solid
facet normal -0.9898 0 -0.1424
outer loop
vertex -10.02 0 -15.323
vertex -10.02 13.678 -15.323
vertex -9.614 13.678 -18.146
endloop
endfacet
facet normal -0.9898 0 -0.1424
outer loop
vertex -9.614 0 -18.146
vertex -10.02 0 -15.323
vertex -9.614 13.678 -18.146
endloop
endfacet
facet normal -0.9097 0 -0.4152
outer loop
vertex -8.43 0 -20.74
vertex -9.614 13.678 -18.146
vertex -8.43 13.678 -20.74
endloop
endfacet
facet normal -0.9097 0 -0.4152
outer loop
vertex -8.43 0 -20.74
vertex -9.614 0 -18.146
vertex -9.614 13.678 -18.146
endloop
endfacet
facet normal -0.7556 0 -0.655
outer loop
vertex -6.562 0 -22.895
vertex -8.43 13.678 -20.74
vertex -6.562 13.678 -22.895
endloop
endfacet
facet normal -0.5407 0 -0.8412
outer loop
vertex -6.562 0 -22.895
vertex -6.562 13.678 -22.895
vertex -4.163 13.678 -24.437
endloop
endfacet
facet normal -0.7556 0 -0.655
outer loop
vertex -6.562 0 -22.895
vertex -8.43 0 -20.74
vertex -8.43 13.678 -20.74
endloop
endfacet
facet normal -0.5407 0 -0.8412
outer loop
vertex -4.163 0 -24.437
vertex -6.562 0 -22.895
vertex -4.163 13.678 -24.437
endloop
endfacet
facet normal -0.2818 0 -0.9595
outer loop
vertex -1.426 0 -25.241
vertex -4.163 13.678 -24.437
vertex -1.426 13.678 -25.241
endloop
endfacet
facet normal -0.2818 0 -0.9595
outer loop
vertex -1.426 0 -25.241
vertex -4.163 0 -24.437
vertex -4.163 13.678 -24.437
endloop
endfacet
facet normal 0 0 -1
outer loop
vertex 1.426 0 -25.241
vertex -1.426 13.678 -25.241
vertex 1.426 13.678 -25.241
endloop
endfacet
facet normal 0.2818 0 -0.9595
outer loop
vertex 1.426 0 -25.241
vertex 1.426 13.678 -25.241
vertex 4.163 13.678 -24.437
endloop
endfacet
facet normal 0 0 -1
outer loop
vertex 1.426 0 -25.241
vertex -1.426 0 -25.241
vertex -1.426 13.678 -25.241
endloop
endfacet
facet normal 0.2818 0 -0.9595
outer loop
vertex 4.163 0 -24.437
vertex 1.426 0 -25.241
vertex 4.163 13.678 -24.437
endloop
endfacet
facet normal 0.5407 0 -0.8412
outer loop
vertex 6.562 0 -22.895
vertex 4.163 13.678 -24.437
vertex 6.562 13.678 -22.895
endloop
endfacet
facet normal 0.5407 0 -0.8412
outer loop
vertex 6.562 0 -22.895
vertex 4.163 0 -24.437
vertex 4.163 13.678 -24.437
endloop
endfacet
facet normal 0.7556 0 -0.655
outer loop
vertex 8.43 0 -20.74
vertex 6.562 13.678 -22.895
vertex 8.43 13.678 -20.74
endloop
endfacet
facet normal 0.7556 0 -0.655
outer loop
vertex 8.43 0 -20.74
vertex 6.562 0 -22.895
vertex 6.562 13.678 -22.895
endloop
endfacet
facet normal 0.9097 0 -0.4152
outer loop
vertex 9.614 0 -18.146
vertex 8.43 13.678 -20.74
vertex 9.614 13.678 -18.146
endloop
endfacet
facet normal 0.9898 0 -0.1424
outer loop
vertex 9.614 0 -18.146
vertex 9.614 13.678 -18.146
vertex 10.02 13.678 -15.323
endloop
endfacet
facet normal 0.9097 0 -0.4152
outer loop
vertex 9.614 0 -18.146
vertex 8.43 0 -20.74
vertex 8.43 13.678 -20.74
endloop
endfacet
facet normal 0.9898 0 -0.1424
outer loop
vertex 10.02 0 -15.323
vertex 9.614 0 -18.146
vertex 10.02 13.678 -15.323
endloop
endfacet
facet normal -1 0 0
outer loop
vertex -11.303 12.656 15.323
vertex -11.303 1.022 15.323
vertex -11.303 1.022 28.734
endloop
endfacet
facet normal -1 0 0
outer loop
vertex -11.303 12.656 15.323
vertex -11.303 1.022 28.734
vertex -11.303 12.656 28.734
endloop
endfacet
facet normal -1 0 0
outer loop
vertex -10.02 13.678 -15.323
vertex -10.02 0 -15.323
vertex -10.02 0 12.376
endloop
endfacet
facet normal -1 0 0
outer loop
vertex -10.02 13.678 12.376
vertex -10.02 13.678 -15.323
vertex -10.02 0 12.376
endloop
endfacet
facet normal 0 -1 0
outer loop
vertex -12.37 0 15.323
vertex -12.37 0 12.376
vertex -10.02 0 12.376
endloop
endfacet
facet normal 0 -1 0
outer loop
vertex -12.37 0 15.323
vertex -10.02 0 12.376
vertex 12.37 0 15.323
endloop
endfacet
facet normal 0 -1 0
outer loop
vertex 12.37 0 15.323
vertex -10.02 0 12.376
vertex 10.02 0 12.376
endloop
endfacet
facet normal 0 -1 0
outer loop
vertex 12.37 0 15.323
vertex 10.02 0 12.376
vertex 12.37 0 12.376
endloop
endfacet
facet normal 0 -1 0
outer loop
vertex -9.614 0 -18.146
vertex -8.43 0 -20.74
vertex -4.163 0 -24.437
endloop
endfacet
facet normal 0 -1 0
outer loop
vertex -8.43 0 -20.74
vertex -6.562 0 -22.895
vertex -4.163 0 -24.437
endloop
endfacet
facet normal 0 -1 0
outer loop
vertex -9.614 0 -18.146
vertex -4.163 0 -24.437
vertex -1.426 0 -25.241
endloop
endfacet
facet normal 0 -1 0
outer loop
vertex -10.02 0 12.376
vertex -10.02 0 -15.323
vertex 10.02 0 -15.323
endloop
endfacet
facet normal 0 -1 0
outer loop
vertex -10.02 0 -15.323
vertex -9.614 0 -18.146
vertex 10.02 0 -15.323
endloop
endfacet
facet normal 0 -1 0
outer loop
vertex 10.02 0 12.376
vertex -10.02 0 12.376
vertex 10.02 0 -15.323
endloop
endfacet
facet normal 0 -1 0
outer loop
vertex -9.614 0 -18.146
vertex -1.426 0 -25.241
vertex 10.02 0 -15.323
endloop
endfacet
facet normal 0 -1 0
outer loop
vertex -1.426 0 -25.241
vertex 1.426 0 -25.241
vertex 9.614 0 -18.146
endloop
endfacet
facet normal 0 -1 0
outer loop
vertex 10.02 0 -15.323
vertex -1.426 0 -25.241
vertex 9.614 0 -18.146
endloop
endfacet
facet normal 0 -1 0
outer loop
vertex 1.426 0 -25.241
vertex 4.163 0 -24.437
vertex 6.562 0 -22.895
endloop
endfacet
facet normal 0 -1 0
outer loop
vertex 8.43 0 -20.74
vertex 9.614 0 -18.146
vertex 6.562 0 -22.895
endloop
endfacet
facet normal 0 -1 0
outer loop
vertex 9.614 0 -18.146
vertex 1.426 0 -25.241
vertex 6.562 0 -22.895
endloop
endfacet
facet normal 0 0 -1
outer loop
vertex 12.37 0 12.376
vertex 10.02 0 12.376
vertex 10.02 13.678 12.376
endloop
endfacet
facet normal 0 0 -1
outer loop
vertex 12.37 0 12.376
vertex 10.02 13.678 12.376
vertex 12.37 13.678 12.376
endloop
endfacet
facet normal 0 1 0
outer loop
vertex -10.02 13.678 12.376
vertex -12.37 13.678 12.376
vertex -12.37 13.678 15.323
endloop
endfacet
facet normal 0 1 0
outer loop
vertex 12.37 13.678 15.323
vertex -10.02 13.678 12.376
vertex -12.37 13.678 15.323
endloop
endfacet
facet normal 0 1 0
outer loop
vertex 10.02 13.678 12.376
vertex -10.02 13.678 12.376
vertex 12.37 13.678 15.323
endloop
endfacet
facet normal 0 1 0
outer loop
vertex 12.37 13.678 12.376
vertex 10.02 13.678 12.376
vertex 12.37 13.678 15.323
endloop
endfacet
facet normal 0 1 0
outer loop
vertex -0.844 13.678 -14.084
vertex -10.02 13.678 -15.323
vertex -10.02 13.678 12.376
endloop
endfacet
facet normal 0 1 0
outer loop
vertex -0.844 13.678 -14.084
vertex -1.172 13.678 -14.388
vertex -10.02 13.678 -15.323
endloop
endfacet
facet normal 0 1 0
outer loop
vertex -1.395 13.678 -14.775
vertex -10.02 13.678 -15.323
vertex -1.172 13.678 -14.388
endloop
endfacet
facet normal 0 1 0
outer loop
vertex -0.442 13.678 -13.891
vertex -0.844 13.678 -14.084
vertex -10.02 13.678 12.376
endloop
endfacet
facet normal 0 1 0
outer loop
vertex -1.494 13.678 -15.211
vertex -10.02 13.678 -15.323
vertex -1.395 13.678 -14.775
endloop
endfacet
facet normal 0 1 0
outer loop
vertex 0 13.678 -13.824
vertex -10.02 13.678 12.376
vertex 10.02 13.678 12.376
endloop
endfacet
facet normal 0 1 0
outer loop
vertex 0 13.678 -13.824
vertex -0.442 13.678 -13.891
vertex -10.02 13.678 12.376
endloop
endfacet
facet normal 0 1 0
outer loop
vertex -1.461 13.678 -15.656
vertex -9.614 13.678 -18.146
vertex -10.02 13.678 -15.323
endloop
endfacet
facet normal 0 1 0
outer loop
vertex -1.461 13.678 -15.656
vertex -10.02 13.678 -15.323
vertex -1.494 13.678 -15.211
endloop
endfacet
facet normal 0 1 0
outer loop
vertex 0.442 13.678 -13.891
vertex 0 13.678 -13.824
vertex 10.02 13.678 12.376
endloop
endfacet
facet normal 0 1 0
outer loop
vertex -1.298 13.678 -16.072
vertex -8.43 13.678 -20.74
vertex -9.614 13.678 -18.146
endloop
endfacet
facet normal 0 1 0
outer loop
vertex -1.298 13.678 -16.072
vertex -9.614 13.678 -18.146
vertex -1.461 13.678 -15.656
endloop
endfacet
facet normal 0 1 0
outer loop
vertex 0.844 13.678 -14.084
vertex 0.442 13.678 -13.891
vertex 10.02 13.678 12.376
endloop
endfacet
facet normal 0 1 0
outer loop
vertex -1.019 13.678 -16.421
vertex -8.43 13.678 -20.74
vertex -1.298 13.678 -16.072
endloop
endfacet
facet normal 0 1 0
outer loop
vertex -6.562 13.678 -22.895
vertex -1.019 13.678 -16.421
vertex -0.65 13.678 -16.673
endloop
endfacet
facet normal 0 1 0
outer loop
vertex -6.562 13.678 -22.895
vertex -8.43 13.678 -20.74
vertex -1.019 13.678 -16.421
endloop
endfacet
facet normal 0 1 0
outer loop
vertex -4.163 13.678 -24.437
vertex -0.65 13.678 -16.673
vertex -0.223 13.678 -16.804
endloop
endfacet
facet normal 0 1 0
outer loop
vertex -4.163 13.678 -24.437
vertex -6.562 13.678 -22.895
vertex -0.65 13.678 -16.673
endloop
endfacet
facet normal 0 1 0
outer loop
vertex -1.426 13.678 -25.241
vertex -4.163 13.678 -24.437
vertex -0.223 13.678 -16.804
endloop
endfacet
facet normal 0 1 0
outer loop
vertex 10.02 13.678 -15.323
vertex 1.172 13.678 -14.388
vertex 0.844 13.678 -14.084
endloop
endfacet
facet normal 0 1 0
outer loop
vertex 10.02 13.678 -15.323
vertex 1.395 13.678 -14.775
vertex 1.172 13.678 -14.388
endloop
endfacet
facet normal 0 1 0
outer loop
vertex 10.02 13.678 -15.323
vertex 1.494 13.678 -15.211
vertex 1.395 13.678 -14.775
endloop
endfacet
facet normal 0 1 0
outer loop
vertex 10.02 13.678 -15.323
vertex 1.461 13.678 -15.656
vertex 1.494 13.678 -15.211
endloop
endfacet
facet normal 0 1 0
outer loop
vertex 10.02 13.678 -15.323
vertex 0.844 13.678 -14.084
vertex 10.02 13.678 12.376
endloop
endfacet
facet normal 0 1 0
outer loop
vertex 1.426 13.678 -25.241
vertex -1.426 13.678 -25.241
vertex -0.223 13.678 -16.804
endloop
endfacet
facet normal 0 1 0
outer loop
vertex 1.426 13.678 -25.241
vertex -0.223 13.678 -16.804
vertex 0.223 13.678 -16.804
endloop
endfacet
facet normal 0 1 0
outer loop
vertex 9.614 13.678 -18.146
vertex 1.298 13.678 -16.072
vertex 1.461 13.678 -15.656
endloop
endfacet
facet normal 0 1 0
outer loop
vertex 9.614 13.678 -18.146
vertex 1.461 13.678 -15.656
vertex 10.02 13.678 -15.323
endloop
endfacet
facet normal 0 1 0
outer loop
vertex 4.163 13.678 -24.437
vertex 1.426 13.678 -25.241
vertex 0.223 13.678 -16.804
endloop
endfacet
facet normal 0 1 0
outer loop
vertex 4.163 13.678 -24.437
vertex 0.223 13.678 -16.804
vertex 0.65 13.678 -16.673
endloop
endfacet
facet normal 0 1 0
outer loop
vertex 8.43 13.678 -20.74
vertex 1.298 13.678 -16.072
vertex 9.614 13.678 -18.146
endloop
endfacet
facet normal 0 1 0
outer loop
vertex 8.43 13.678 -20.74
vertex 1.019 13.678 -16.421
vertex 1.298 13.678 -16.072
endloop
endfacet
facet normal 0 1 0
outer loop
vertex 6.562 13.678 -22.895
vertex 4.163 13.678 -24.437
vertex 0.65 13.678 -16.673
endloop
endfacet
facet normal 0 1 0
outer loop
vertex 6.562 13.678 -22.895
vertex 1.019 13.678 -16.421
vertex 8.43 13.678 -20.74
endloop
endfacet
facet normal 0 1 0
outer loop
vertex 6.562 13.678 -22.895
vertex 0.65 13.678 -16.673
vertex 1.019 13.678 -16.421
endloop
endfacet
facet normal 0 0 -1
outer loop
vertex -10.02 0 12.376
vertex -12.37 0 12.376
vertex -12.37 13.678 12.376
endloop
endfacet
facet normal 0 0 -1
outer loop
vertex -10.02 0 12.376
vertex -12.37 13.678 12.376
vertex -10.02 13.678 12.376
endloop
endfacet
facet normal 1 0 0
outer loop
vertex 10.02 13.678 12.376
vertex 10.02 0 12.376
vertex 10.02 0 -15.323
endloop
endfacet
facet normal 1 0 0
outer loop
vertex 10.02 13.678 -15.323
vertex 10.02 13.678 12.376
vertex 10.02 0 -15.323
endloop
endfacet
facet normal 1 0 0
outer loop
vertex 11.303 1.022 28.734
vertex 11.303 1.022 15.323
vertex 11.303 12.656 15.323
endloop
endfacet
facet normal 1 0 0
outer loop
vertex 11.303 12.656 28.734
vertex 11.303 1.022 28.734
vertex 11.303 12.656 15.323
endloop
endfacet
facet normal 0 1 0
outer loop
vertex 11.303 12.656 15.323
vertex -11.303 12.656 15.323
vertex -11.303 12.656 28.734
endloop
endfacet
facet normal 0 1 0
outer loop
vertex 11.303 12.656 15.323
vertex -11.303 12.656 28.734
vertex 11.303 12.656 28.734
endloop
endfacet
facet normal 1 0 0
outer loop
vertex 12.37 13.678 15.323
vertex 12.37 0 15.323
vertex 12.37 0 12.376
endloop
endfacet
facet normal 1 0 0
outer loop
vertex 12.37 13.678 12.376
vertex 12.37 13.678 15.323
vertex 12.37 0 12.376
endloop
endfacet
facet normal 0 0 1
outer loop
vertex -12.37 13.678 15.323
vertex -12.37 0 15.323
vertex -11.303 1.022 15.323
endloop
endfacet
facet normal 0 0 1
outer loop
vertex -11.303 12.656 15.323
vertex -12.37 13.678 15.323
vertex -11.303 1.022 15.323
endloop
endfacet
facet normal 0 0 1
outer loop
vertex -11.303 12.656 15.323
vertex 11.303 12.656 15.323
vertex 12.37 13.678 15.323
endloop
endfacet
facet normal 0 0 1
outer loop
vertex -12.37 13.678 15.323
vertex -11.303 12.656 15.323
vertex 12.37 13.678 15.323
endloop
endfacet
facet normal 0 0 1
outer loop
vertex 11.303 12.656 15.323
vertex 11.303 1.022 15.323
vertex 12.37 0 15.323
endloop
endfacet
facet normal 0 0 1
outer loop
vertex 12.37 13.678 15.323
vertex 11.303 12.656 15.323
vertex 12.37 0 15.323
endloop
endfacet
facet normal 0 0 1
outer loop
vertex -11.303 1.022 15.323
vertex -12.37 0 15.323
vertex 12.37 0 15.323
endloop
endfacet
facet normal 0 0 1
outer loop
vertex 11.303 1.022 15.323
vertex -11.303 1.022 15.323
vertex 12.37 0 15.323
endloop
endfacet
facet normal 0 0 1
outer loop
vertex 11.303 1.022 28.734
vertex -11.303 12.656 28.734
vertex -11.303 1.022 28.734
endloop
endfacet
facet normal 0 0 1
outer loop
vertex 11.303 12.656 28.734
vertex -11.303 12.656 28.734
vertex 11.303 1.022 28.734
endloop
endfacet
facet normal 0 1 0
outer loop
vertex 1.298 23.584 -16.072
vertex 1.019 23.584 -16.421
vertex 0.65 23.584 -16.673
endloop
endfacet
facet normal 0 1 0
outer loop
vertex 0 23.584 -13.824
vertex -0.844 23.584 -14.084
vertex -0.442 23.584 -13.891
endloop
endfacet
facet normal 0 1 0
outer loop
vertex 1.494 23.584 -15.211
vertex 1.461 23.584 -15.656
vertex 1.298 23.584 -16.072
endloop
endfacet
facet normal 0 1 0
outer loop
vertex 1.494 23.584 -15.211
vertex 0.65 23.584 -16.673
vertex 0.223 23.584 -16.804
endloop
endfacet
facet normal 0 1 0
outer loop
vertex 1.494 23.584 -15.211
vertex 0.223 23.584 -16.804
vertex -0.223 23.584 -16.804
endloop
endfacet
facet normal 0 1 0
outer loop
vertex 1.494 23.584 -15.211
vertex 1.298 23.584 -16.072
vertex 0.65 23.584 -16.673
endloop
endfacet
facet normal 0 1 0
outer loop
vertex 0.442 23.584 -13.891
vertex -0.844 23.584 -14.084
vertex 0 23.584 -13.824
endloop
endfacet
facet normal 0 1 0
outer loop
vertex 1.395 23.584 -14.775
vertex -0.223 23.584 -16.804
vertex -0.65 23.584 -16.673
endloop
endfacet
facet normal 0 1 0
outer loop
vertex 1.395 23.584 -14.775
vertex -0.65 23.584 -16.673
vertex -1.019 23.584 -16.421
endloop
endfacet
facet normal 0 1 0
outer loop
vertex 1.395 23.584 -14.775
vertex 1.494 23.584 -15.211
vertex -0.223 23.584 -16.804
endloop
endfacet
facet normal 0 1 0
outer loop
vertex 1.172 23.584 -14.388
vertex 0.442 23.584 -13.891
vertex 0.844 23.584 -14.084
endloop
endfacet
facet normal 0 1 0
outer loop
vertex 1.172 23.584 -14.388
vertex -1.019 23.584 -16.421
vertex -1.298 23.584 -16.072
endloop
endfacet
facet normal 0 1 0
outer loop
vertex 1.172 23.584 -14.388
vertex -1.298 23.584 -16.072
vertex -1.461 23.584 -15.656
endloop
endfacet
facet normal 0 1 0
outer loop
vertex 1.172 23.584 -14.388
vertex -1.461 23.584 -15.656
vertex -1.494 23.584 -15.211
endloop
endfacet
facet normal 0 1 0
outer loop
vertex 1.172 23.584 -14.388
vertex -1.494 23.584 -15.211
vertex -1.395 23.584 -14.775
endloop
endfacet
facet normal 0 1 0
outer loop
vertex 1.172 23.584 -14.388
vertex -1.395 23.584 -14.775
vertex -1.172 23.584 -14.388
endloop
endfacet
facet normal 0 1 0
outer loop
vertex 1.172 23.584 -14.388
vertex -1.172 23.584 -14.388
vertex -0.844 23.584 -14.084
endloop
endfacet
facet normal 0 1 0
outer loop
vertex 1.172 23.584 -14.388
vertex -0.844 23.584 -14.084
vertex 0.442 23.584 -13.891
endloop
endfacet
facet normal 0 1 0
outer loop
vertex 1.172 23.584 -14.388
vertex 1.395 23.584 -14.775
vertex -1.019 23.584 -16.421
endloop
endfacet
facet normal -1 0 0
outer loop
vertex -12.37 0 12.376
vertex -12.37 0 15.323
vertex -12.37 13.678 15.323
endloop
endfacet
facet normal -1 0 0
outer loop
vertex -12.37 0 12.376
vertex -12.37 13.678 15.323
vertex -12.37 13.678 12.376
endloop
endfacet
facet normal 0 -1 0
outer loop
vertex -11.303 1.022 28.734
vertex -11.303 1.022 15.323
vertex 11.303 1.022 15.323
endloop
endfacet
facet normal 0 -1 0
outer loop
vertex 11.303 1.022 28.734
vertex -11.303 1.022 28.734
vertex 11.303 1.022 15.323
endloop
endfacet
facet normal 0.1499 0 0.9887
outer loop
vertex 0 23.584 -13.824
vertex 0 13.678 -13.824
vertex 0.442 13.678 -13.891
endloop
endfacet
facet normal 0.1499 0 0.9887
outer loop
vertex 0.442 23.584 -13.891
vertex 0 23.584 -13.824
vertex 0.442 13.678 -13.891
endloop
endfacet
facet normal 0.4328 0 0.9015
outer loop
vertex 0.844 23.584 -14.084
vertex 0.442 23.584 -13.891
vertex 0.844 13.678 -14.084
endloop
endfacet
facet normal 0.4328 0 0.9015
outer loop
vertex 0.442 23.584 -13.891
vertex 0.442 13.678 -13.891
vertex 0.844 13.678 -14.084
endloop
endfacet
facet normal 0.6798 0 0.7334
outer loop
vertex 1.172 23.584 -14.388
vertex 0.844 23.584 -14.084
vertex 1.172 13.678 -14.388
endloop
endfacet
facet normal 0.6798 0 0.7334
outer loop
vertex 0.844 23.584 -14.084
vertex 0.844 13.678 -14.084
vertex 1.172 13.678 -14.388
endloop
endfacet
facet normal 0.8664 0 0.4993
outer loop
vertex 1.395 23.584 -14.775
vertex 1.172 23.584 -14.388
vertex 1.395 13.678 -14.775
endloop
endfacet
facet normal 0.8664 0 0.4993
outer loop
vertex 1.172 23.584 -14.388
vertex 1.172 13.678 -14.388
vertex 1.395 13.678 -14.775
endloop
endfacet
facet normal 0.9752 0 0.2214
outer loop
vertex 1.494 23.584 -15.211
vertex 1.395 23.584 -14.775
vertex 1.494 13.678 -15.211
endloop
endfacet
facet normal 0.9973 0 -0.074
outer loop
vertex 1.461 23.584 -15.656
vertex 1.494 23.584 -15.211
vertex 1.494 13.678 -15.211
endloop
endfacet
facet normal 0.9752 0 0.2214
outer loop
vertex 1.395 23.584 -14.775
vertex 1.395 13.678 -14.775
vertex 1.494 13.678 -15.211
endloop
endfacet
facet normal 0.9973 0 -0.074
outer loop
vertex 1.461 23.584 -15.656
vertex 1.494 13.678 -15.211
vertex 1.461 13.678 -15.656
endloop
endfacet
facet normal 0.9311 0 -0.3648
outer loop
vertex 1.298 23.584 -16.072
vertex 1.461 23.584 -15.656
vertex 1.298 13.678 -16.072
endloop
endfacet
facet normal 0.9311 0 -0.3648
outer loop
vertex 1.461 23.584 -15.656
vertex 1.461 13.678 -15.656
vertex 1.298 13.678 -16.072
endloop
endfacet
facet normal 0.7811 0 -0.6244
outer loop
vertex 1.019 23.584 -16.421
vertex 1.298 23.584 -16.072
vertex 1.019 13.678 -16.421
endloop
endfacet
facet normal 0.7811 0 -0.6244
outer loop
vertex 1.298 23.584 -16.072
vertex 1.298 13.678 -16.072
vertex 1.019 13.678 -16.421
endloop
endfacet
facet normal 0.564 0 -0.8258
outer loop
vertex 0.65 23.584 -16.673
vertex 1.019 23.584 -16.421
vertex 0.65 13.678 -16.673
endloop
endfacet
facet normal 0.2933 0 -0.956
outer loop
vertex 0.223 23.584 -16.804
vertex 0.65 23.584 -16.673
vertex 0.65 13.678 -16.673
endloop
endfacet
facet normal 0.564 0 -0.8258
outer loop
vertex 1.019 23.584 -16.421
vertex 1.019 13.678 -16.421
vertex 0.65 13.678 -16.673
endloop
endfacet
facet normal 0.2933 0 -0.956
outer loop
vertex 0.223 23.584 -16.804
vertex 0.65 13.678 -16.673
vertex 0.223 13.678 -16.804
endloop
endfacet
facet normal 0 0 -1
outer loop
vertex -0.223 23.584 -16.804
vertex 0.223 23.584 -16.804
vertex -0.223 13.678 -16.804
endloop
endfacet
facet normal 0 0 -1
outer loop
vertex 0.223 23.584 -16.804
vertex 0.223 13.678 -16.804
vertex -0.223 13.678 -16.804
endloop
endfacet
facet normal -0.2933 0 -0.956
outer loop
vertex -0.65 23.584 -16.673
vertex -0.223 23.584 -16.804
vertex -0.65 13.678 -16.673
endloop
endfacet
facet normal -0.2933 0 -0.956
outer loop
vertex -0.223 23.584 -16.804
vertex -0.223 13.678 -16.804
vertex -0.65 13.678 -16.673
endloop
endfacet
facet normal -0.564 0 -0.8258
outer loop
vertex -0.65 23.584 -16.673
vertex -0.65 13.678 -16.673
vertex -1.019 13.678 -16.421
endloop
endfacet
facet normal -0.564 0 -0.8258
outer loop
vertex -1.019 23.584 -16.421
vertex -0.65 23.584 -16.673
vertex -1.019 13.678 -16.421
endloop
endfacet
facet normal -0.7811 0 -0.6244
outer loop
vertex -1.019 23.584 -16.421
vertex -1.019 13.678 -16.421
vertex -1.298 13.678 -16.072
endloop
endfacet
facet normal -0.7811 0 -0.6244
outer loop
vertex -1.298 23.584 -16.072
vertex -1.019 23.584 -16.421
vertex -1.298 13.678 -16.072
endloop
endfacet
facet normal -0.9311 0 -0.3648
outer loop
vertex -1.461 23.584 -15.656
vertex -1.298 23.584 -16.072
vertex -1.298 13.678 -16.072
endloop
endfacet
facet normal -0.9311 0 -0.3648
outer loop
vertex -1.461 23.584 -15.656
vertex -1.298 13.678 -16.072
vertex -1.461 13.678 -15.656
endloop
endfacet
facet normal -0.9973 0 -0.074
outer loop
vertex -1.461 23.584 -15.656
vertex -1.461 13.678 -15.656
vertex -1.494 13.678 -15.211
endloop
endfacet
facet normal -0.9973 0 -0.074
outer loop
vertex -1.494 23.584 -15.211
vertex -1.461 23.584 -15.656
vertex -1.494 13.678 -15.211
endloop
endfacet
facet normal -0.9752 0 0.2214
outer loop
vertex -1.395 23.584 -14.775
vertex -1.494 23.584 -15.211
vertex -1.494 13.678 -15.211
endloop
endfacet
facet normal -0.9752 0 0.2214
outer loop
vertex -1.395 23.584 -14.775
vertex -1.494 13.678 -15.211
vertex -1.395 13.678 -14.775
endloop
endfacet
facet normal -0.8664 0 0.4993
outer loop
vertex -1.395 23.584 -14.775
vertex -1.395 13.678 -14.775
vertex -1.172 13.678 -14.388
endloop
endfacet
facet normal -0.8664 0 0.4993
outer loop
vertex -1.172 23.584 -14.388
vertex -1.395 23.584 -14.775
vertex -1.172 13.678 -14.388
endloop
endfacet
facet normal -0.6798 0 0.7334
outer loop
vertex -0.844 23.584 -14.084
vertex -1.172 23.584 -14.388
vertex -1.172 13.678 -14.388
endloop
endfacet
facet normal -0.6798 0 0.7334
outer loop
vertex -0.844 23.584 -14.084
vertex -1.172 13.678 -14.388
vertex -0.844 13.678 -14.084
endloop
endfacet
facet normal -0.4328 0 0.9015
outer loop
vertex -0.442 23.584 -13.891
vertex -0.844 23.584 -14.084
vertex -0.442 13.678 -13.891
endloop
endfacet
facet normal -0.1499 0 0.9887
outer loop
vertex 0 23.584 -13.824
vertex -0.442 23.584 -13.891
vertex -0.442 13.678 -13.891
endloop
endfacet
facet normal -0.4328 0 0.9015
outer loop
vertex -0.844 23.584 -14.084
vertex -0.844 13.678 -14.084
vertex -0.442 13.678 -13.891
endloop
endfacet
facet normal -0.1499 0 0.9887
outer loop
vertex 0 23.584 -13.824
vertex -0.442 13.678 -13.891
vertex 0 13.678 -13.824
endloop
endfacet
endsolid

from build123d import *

# Parameters (mm, degrees)
SKETCH1_W           = 20.0406
SKETCH1_H           = 27.6987
SKETCH1_H_2         = 2.9464
SKETCH1_W_2         = 2.3495
BOSS_EXTRUDE1_DEPTH = 13.6779
SKETCH2_W           = 22.606
SKETCH2_H           = 11.6332
BOSS_EXTRUDE2_DEPTH = 13.4112
SKETCH3_R           = 1.4986
BOSS_EXTRUDE3_DEPTH = 9.906


with BuildPart() as part:
    # Sketch1 → Boss-Extrude1 (new body)
    with BuildSketch(Plane(origin=(0, 0, 0), x_dir=(1, 0, 0), z_dir=(0, 1, 0))):
        with Locations((0, 1.4732)):
            Rectangle(SKETCH1_W, SKETCH1_H)
        with Locations((0, -13.84935)):
            Rectangle(SKETCH1_W, SKETCH1_H_2)
        with Locations((-11.19505, -13.84935)):
            Rectangle(SKETCH1_W_2, SKETCH1_H_2)
        with Locations((11.19505, -13.84935)):
            Rectangle(SKETCH1_W_2, SKETCH1_H_2)
        with BuildLine():
            ThreePointArc((-10.0203, 15.32255), (0, 25.34285), (10.0203, 15.32255))
            Line((10.0203, 15.32255), (-10.0203, 15.32255))
        make_face()
    extrude(amount=BOSS_EXTRUDE1_DEPTH)

    # Sketch2 → Boss-Extrude2 (add)
    with BuildSketch(Plane.XY.offset(15.32255)):
        with Locations((0, 6.83895)):
            Rectangle(SKETCH2_W, SKETCH2_H)
    extrude(amount=BOSS_EXTRUDE2_DEPTH)

    # Sketch3 → Boss-Extrude3 (add)
    with BuildSketch(Plane(origin=(0, 13.6779, 0), x_dir=(1, 0, 0), z_dir=(0, 1, 0))):
        with Locations(Location((0, 15.32255, 0), (0, 0, 270))):
            Circle(SKETCH3_R)
    extrude(amount=BOSS_EXTRUDE3_DEPTH)


solid = part.part
